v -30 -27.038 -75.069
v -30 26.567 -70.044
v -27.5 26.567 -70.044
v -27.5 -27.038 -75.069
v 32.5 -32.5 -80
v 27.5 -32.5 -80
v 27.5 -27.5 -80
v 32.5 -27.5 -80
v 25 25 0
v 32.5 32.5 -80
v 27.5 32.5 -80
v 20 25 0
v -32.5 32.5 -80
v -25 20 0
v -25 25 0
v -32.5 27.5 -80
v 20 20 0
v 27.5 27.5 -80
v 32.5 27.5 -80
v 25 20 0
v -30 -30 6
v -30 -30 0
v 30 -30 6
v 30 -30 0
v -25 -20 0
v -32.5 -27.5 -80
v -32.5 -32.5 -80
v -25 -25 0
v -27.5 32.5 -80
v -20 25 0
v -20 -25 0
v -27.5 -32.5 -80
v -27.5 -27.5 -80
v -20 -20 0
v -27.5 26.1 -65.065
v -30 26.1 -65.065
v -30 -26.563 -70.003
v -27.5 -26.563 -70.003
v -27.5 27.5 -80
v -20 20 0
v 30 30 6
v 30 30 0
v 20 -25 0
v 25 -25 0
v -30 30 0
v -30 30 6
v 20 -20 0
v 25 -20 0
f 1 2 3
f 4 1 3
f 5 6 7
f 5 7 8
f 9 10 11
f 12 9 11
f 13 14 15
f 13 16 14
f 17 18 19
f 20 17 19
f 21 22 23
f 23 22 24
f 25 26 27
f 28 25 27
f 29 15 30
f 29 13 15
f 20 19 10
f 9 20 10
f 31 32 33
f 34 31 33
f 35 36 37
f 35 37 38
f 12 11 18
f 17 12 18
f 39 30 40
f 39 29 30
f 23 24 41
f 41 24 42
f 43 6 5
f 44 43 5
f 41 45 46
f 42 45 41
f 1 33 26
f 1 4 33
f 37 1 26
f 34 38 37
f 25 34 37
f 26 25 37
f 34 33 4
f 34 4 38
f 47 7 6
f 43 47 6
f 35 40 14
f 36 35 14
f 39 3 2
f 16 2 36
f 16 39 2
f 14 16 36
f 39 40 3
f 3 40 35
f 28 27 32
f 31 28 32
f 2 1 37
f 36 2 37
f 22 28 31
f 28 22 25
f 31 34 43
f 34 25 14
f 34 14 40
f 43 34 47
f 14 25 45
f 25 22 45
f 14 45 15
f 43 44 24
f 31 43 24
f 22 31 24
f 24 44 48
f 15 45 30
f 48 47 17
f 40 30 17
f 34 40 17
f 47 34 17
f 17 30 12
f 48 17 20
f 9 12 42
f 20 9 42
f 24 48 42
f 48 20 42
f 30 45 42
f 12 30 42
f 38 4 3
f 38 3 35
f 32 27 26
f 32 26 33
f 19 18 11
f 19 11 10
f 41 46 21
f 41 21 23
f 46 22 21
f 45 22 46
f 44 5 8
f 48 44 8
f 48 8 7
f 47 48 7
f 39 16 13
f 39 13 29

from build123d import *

# Parameters (mm, degrees)
F0_W      = 60
F0_H      = 60
F1_DEPTH  = 6
F2_W      = 5
F2_H      = 5
F4_W      = 5
F4_H      = 5
F7_W      = 5
F7_H      = 5
F6_W      = 5
F6_H      = 5
F9_W      = 5
F9_H      = 5
F10_W     = 5
F10_H     = 5
F12_W     = 5
F12_H     = 5
F13_W     = 5
F13_H     = 5
F15_W     = 2.5
F15_H     = 5
F16_DEPTH = 55


with BuildPart() as f1:
    # F0 (on Top) → F1 (new body)
    with BuildSketch(Plane.XY):
        Rectangle(F0_W, F0_H)
    extrude(amount=F1_DEPTH)

    # F2 (on face) → F5 section 0
    with BuildSketch(Plane(origin=(0, 0, 0), x_dir=(1, 0, 0), z_dir=(0, 0, -1))):
        with Locations((-22.5, -22.5)):
            Rectangle(F2_W, F2_H)
    # F4 (on offset) → F5 section 1
    with BuildSketch(Plane.XY.offset(-80)):
        with Locations((-30, 30)):
            Rectangle(F4_W, F4_H)
    loft()

    # F7 (on offset) → F8 section 0
    with BuildSketch(Plane.XY.offset(-80)):
        with Locations((-30, -30)):
            Rectangle(F7_W, F7_H)
    # F6 (on face) → F8 section 1
    with BuildSketch(Plane(origin=(0, 0, 0), x_dir=(1, 0, 0), z_dir=(0, 0, -1))):
        with Locations((-22.5, 22.5)):
            Rectangle(F6_W, F6_H)
    loft()

    # F9 (on offset) → F11 section 0
    with BuildSketch(Plane.XY.offset(-80)):
        with Locations((30, -30)):
            Rectangle(F9_W, F9_H)
    # F10 (on face) → F11 section 1
    with BuildSketch(Plane(origin=(0, 0, 0), x_dir=(1, 0, 0), z_dir=(0, 0, -1))):
        with Locations((22.5, 22.5)):
            Rectangle(F10_W, F10_H)
    loft()

    # F12 (on offset) → F14 section 0
    with BuildSketch(Plane.XY.offset(-80)):
        with Locations((30, 30)):
            Rectangle(F12_W, F12_H)
    # F13 (on face) → F14 section 1
    with BuildSketch(Plane(origin=(0, 0, 0), x_dir=(1, 0, 0), z_dir=(0, 0, -1))):
        with Locations((22.5, -22.5)):
            Rectangle(F13_W, F13_H)
    loft()

    # F15 (on face) → F16 (join)
    with BuildSketch(Plane(origin=(0, 19.82575, 1.858664), x_dir=(1, 0, 0), z_dir=(0, -0.995634, -0.093341))):
        with Locations((-28.75, -69.717608)):
            Rectangle(F15_W, F15_H)
    extrude(amount=F16_DEPTH)


solid = f1.part
